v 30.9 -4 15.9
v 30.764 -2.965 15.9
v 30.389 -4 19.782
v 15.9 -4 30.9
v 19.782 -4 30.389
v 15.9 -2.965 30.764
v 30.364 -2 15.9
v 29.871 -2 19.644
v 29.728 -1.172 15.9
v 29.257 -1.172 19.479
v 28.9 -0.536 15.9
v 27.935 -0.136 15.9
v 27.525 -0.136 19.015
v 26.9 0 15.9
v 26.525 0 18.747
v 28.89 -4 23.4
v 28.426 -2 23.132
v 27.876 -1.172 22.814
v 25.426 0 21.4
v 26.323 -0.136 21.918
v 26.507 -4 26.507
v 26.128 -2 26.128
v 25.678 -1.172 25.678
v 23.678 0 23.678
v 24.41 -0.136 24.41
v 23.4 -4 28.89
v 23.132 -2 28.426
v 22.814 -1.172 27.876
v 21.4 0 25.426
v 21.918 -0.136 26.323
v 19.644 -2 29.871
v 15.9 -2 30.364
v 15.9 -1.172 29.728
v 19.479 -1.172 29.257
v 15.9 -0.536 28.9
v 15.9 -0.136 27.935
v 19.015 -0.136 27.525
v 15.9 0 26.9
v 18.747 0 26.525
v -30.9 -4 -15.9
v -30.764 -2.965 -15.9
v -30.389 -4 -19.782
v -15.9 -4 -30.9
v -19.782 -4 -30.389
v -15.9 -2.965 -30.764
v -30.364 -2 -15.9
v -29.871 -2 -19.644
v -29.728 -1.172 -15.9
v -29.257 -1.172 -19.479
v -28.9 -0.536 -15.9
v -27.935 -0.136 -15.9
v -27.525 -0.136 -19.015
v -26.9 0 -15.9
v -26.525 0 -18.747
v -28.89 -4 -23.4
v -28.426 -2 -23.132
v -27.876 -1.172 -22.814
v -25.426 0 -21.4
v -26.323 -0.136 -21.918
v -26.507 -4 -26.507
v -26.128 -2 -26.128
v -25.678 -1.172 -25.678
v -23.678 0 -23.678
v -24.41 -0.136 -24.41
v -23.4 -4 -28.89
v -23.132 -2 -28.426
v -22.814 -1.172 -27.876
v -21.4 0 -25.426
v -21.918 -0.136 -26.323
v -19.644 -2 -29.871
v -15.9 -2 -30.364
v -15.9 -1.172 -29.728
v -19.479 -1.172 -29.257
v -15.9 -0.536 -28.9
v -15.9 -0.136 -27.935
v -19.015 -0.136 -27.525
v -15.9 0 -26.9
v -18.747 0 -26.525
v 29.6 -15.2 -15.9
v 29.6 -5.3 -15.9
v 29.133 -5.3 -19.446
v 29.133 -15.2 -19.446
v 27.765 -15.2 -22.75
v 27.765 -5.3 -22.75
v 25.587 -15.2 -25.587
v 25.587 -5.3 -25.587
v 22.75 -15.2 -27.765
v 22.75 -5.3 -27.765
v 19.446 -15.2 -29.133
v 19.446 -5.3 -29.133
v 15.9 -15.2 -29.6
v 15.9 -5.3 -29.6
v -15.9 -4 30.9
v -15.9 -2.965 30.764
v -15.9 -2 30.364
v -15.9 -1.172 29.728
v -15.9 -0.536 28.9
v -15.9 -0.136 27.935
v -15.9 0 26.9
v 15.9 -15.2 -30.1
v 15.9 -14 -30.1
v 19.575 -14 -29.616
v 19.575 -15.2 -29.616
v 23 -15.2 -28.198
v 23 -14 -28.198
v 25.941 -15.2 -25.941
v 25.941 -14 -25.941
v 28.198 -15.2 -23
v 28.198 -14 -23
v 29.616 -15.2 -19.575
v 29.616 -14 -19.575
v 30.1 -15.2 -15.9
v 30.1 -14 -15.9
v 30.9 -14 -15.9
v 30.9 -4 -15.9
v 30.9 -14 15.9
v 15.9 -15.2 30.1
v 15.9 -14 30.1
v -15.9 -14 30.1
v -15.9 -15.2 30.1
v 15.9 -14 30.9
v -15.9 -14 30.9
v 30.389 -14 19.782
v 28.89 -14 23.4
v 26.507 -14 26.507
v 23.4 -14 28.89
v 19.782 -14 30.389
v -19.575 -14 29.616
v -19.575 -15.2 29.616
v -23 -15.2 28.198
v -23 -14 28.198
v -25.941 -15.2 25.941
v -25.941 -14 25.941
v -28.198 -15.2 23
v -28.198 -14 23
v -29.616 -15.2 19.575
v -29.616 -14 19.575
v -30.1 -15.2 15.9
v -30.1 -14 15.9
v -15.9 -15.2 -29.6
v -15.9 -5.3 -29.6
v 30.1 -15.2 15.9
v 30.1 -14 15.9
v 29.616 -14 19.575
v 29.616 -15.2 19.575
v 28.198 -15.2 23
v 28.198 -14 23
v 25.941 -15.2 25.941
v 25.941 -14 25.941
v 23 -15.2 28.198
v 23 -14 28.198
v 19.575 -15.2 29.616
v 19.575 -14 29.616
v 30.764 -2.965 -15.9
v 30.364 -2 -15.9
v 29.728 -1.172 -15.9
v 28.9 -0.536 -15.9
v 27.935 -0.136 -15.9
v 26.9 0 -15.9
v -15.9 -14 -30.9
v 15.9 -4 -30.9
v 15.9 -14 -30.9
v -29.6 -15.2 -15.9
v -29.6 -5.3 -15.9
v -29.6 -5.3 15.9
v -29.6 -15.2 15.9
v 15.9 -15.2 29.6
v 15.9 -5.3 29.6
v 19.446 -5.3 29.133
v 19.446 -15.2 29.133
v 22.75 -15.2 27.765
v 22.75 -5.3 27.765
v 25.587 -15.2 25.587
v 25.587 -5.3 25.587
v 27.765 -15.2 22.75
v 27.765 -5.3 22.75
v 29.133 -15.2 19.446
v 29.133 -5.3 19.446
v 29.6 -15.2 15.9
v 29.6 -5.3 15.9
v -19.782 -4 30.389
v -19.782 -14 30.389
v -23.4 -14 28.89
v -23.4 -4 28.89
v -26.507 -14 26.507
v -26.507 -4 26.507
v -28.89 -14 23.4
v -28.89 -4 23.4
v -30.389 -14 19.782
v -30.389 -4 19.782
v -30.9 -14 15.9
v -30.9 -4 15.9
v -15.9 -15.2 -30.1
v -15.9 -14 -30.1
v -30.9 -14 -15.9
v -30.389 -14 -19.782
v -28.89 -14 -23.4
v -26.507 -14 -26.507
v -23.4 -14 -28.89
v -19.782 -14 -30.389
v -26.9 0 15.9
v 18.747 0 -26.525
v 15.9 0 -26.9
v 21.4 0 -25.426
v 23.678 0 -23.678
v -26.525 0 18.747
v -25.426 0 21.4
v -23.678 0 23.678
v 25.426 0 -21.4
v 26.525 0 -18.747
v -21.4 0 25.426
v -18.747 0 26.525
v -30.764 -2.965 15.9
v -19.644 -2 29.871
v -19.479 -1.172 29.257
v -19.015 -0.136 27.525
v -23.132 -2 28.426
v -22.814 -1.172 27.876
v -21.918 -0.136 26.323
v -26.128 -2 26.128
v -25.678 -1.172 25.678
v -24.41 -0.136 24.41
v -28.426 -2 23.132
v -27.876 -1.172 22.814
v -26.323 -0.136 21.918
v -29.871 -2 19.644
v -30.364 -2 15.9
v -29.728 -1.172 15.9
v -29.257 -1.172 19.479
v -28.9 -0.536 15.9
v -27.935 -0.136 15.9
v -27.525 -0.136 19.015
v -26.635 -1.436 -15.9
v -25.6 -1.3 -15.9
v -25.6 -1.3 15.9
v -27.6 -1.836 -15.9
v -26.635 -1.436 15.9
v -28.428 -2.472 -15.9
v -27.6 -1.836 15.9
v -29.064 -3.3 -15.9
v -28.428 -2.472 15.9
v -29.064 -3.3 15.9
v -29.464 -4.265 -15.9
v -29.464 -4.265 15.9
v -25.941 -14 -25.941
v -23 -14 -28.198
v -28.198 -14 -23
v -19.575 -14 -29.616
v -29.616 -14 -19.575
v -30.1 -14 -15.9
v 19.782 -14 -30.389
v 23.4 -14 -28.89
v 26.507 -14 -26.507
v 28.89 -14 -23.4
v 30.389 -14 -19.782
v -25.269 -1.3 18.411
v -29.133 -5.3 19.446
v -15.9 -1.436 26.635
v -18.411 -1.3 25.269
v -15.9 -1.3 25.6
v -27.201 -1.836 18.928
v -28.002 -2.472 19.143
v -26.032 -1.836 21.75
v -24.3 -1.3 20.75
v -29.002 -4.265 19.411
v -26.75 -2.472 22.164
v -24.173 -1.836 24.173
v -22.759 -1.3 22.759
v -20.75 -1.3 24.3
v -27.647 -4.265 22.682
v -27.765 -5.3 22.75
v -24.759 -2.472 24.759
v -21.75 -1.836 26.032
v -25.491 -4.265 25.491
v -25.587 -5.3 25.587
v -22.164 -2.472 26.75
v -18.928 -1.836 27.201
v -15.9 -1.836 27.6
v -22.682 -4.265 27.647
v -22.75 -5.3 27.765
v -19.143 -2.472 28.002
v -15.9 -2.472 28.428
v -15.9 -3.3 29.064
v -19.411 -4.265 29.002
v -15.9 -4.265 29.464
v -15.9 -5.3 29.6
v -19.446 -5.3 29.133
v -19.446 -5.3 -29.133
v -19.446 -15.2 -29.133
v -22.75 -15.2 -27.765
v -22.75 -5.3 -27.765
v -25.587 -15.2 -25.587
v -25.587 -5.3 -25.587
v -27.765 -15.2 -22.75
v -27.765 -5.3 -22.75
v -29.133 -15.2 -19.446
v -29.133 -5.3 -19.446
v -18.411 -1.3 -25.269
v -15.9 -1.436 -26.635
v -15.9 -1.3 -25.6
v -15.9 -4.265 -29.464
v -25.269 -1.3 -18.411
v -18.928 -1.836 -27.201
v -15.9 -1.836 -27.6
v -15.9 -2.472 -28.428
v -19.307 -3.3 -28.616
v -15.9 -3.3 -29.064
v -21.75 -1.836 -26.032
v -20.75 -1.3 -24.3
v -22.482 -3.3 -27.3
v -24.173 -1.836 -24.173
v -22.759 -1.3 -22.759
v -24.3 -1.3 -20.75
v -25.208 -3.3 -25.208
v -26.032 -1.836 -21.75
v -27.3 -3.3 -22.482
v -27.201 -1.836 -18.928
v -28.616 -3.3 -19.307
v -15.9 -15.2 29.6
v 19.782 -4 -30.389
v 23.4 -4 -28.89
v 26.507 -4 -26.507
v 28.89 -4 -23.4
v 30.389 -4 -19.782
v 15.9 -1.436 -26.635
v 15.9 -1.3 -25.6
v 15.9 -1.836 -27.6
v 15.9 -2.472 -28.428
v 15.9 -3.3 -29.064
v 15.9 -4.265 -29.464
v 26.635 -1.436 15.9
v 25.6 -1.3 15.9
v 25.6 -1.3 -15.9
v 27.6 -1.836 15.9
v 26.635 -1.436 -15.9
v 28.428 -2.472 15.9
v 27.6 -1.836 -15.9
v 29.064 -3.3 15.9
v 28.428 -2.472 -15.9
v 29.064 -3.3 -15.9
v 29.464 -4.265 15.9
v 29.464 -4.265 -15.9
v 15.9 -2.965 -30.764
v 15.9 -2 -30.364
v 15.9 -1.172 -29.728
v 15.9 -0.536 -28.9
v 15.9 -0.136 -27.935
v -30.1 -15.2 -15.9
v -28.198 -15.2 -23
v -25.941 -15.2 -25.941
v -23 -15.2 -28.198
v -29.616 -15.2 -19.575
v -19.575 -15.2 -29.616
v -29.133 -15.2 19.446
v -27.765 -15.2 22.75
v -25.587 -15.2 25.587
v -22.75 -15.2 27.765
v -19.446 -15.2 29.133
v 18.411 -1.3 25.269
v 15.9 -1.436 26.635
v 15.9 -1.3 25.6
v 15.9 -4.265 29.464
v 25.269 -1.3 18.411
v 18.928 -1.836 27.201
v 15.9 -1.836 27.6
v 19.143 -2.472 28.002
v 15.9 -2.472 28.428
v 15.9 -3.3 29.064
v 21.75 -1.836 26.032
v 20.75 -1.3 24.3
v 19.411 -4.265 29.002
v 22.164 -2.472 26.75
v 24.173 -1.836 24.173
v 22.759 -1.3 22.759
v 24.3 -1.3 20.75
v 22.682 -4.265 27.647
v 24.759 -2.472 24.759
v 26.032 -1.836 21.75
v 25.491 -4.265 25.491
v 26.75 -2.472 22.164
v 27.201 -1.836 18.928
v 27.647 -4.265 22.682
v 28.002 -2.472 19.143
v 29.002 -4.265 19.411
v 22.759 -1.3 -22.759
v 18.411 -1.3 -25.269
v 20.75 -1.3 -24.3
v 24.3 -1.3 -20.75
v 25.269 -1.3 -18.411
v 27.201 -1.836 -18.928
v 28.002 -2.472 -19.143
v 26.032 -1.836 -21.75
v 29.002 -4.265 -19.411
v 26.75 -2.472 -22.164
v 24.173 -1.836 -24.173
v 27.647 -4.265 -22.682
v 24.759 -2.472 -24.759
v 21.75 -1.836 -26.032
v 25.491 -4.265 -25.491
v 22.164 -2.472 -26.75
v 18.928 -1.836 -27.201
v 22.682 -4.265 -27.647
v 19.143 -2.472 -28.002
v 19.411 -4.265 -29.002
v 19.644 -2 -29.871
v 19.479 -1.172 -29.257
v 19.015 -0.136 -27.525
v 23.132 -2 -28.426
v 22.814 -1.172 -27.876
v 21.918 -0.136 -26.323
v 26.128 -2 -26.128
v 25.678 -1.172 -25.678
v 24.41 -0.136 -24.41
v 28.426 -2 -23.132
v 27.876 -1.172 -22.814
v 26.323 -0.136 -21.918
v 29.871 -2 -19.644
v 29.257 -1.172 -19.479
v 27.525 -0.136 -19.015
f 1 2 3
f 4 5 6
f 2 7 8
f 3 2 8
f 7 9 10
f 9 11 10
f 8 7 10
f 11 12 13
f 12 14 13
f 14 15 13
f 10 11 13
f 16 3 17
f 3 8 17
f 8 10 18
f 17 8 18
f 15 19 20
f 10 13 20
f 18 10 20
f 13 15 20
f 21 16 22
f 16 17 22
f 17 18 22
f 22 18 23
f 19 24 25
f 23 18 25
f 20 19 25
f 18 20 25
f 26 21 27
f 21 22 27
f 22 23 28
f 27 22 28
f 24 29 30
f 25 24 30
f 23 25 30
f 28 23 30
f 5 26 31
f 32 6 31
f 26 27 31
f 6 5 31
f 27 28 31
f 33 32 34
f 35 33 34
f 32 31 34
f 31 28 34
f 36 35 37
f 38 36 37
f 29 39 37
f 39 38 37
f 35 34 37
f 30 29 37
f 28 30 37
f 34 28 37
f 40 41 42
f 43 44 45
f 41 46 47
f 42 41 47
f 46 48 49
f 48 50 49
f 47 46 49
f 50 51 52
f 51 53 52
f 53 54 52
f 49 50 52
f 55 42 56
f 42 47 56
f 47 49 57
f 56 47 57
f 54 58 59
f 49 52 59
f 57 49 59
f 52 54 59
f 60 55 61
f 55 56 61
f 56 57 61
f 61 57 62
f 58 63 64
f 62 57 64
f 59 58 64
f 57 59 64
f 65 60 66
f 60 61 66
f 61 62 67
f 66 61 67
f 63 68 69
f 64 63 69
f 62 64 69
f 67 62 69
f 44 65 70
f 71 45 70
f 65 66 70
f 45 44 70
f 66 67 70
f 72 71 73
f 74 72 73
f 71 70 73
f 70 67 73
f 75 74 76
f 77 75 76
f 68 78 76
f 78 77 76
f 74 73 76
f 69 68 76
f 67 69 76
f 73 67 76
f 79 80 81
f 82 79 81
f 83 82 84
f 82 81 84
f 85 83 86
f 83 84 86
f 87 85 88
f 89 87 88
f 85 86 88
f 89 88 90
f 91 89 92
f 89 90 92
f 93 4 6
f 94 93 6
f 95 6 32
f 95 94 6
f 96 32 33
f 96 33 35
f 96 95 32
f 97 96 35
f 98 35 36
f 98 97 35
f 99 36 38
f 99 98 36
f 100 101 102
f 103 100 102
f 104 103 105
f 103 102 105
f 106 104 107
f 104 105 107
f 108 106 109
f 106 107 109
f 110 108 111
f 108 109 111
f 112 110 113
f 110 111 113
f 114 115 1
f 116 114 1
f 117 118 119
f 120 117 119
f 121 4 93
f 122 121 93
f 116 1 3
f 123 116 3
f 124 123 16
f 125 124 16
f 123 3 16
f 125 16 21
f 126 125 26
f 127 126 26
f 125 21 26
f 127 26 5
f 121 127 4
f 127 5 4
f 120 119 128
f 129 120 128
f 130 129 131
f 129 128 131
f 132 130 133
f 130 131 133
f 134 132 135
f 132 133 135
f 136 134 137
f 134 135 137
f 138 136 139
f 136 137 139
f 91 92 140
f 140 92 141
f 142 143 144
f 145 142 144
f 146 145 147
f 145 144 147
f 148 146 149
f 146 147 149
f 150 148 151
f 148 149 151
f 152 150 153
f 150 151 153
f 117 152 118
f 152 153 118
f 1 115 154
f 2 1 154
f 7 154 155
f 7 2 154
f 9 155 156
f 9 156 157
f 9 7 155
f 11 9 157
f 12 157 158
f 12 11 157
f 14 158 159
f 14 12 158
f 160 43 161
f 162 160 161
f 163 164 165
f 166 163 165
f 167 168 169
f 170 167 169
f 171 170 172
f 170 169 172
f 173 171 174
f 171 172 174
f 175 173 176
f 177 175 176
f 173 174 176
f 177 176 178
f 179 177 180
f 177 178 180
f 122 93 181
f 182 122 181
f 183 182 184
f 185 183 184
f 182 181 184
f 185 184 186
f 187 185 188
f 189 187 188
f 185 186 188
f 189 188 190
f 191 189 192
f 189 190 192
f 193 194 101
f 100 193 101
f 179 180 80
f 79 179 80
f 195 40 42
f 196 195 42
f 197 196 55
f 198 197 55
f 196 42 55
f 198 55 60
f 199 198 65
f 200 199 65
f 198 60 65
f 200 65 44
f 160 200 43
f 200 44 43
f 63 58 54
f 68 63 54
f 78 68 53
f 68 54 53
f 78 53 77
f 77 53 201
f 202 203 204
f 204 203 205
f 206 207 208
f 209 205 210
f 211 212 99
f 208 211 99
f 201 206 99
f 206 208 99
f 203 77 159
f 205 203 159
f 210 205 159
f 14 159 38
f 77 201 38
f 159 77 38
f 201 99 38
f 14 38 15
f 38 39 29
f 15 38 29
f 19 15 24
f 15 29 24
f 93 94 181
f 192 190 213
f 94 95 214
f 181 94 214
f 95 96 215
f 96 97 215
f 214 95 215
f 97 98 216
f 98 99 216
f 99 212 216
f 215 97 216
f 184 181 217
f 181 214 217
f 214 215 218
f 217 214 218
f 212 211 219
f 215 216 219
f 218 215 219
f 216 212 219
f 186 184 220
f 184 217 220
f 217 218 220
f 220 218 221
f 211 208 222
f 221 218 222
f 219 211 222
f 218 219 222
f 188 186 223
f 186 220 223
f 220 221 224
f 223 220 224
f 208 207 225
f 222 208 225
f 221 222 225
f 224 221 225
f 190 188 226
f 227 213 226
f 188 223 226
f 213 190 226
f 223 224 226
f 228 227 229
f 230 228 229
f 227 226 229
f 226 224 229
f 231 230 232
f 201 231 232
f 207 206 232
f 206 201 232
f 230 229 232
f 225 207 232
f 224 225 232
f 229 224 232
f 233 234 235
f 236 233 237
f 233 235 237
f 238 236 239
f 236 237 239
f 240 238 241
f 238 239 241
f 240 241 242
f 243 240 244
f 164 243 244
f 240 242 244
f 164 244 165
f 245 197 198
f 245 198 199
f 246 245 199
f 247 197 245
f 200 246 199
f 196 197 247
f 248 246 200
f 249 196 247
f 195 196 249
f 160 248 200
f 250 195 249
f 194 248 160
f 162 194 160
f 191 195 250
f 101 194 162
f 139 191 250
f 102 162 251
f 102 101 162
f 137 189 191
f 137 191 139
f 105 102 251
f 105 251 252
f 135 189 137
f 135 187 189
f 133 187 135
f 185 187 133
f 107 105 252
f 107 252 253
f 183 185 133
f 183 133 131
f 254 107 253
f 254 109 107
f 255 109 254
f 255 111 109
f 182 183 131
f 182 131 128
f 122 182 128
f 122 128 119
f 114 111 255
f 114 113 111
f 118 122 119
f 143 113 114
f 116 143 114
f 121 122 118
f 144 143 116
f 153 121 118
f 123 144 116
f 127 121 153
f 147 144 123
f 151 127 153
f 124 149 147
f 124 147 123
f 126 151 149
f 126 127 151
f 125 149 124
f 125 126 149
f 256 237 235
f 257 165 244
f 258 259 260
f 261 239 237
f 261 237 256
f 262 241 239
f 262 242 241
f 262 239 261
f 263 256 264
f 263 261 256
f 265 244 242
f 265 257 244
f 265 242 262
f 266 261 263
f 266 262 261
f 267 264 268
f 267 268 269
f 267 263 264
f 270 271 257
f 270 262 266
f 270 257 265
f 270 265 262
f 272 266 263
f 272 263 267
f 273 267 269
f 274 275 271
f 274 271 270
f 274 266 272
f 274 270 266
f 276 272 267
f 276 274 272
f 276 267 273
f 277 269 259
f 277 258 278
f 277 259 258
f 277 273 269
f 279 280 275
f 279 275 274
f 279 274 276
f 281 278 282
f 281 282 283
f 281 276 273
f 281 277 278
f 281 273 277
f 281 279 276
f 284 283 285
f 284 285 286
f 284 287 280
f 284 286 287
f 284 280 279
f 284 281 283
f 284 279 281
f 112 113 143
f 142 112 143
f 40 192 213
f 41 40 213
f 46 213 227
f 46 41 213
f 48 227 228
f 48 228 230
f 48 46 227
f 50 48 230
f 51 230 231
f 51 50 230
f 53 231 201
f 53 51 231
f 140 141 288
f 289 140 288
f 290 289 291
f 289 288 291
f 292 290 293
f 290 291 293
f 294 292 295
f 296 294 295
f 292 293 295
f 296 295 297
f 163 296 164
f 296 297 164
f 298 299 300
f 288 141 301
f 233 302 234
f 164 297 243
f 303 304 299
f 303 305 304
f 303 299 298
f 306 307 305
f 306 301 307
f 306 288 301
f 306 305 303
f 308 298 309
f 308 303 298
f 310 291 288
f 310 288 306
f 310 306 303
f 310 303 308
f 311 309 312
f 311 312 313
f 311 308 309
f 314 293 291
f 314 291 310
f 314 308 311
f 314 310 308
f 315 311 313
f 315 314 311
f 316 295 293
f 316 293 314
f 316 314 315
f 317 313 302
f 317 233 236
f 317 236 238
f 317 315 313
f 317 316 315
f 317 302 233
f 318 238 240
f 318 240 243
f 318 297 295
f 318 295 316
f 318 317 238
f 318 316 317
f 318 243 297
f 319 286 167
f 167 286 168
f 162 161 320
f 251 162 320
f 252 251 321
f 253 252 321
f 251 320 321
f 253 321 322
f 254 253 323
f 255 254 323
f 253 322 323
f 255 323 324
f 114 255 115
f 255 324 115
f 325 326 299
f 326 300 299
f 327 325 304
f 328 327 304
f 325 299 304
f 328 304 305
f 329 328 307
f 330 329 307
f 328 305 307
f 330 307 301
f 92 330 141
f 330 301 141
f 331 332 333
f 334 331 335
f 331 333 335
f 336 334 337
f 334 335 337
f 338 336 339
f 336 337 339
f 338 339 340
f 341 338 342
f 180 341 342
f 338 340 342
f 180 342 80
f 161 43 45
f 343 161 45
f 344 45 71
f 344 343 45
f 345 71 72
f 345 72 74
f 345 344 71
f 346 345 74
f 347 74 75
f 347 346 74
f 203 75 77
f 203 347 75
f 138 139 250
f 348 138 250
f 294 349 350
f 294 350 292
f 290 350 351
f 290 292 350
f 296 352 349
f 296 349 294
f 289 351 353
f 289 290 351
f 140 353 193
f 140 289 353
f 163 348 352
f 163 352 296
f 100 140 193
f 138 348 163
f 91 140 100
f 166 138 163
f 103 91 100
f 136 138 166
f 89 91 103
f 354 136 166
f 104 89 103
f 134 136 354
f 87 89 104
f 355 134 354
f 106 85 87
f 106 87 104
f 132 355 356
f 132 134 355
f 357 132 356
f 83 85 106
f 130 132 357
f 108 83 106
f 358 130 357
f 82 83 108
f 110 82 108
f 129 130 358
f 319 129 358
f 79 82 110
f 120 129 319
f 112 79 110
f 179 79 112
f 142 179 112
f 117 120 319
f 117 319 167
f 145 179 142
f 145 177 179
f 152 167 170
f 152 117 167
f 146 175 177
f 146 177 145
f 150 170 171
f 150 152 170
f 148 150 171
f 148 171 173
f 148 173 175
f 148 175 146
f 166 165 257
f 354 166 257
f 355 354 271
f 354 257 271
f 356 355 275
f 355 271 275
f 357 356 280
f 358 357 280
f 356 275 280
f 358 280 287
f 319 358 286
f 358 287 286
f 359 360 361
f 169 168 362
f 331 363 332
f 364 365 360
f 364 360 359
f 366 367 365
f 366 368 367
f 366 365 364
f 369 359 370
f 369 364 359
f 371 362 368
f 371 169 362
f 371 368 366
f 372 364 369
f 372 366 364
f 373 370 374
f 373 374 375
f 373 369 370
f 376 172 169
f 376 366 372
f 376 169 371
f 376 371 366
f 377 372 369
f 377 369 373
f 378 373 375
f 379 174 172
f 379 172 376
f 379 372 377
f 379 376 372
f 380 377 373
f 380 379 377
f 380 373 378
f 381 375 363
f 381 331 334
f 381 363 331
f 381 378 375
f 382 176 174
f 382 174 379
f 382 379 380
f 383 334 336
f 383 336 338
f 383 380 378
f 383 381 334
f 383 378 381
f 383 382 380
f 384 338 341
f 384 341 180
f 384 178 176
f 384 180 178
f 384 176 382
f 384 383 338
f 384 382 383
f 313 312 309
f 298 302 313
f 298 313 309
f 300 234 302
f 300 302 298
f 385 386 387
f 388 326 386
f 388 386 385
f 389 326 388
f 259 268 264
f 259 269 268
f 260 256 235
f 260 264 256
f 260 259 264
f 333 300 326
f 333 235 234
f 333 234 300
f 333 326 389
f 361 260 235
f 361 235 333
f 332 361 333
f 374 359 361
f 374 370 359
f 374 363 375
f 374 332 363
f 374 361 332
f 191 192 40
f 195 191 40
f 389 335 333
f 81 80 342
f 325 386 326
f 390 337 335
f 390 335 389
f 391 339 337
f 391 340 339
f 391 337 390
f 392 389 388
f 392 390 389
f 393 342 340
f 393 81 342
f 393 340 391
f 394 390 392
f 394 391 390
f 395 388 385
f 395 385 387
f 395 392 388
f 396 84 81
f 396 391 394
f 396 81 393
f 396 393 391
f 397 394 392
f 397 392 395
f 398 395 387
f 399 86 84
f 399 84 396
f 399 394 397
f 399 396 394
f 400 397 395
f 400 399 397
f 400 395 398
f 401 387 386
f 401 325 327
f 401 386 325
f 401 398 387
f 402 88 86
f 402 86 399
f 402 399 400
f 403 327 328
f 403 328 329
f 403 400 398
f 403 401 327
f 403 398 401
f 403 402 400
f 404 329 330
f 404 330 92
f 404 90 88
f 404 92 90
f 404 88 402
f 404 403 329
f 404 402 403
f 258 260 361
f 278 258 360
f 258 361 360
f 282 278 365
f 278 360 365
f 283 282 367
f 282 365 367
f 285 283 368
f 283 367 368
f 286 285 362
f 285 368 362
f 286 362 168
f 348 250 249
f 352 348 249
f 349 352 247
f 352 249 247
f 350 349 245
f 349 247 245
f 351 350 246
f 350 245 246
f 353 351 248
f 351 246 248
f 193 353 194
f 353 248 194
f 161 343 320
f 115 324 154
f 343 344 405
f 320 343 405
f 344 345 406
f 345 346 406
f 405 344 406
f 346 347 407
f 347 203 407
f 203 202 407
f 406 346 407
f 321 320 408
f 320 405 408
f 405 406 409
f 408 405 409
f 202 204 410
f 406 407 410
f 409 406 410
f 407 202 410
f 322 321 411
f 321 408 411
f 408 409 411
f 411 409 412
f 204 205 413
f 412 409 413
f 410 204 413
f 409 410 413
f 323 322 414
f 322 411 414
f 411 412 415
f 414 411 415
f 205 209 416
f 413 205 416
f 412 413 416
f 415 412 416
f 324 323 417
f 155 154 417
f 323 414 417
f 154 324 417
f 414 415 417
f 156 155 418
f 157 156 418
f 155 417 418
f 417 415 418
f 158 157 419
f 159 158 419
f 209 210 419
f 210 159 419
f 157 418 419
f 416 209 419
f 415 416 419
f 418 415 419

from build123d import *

# Parameters (mm, degrees)
F1_DEPTH = 1.3
F2_DEPTH = 14
F4_DEPTH = 1.2
F5_R     = 4
F6_R     = 4


with BuildPart() as f1:
    # F0 (on Front) → F1 (new body)
    with BuildSketch(Plane.XZ):
        with BuildLine():
            Line((15.9, 30.9), (-15.9, 30.9))
            ThreePointArc((-15.9, 30.9), (-26.506602, 26.506602), (-30.9, 15.9))
            Line((-30.9, 15.9), (-30.9, -15.9))
            ThreePointArc((-30.9, -15.9), (-26.506602, -26.506602), (-15.9, -30.9))
            Line((-15.9, -30.9), (15.9, -30.9))
            ThreePointArc((15.9, -30.9), (26.506602, -26.506602), (30.9, -15.9))
            Line((30.9, -15.9), (30.9, 15.9))
            ThreePointArc((30.9, 15.9), (26.506602, 26.506602), (15.9, 30.9))
        make_face()
        with BuildLine():
            ThreePointArc((-29.6, 15.9), (-25.587363, 25.587363), (-15.9, 29.6))
            Line((-15.9, 29.6), (15.9, 29.6))
            ThreePointArc((15.9, 29.6), (25.587363, 25.587363), (29.6, 15.9))
            Line((29.6, 15.9), (29.6, -15.9))
            ThreePointArc((29.6, -15.9), (25.587363, -25.587363), (15.9, -29.6))
            Line((15.9, -29.6), (-15.9, -29.6))
            ThreePointArc((-15.9, -29.6), (-25.587363, -25.587363), (-29.6, -15.9))
            Line((-29.6, -15.9), (-29.6, 15.9))
        make_face(mode=Mode.SUBTRACT)
        with BuildLine():
            Line((15.9, 29.6), (-15.9, 29.6))
            ThreePointArc((-15.9, 29.6), (-25.587363, 25.587363), (-29.6, 15.9))
            Line((-29.6, 15.9), (-29.6, -15.9))
            ThreePointArc((-29.6, -15.9), (-25.587363, -25.587363), (-15.9, -29.6))
            Line((-15.9, -29.6), (15.9, -29.6))
            ThreePointArc((15.9, -29.6), (25.587363, -25.587363), (29.6, -15.9))
            Line((29.6, -15.9), (29.6, 15.9))
            ThreePointArc((29.6, 15.9), (25.587363, 25.587363), (15.9, 29.6))
        make_face()
    extrude(amount=F1_DEPTH)

    # F0 (on Front) → F2 (join)
    with BuildSketch(Plane.XZ):
        with BuildLine():
            Line((15.9, 30.9), (-15.9, 30.9))
            ThreePointArc((-15.9, 30.9), (-26.506602, 26.506602), (-30.9, 15.9))
            Line((-30.9, 15.9), (-30.9, -15.9))
            ThreePointArc((-30.9, -15.9), (-26.506602, -26.506602), (-15.9, -30.9))
            Line((-15.9, -30.9), (15.9, -30.9))
            ThreePointArc((15.9, -30.9), (26.506602, -26.506602), (30.9, -15.9))
            Line((30.9, -15.9), (30.9, 15.9))
            ThreePointArc((30.9, 15.9), (26.506602, 26.506602), (15.9, 30.9))
        make_face()
        with BuildLine():
            ThreePointArc((-29.6, 15.9), (-25.587363, 25.587363), (-15.9, 29.6))
            Line((-15.9, 29.6), (15.9, 29.6))
            ThreePointArc((15.9, 29.6), (25.587363, 25.587363), (29.6, 15.9))
            Line((29.6, 15.9), (29.6, -15.9))
            ThreePointArc((29.6, -15.9), (25.587363, -25.587363), (15.9, -29.6))
            Line((15.9, -29.6), (-15.9, -29.6))
            ThreePointArc((-15.9, -29.6), (-25.587363, -25.587363), (-29.6, -15.9))
            Line((-29.6, -15.9), (-29.6, 15.9))
        make_face(mode=Mode.SUBTRACT)
    extrude(amount=F2_DEPTH)

    # F3 (on face) → F4 (join)
    with BuildSketch(Plane.XZ.offset(14)):
        with BuildLine():
            Line((15.9, 30.1), (-15.9, 30.1))
            ThreePointArc((-15.9, 30.1), (-25.940916, 25.940916), (-30.1, 15.9))
            Line((-30.1, 15.9), (-30.1, -15.9))
            ThreePointArc((-30.1, -15.9), (-25.940916, -25.940916), (-15.9, -30.1))
            Line((-15.9, -30.1), (15.9, -30.1))
            ThreePointArc((15.9, -30.1), (25.940916, -25.940916), (30.1, -15.9))
            Line((30.1, -15.9), (30.1, 15.9))
            ThreePointArc((30.1, 15.9), (25.940916, 25.940916), (15.9, 30.1))
        make_face()
        with BuildLine():
            Line((15.9, -29.6), (-15.9, -29.6))
            ThreePointArc((-15.9, -29.6), (-25.587363, -25.587363), (-29.6, -15.9))
            Line((-29.6, -15.9), (-29.6, 15.9))
            ThreePointArc((-29.6, 15.9), (-25.587363, 25.587363), (-15.9, 29.6))
            Line((-15.9, 29.6), (15.9, 29.6))
            ThreePointArc((15.9, 29.6), (25.587363, 25.587363), (29.6, 15.9))
            Line((29.6, 15.9), (29.6, -15.9))
            ThreePointArc((29.6, -15.9), (25.587363, -25.587363), (15.9, -29.6))
        make_face(mode=Mode.SUBTRACT)
    extrude(amount=F4_DEPTH)

    # F5
    f5_edges = [f1.edges().sort_by_distance(p)[0] for p in [
        (-25.587363, -1.3, -25.587363),
    ]]
    fillet(f5_edges, radius=F5_R)

    # F6
    f6_edges = [f1.edges().sort_by_distance(p)[0] for p in [
        (0, 0, 30.9),
        (-26.506602, 0, 26.506602),
        (-30.9, 0, 0),
        (-26.506602, 0, -26.506602),
        (0, 0, -30.9),
        (26.506602, 0, -26.506602),
        (30.9, 0, 0),
        (26.506602, 0, 26.506602),
    ]]
    fillet(f6_edges, radius=F6_R)


solid = f1.part
